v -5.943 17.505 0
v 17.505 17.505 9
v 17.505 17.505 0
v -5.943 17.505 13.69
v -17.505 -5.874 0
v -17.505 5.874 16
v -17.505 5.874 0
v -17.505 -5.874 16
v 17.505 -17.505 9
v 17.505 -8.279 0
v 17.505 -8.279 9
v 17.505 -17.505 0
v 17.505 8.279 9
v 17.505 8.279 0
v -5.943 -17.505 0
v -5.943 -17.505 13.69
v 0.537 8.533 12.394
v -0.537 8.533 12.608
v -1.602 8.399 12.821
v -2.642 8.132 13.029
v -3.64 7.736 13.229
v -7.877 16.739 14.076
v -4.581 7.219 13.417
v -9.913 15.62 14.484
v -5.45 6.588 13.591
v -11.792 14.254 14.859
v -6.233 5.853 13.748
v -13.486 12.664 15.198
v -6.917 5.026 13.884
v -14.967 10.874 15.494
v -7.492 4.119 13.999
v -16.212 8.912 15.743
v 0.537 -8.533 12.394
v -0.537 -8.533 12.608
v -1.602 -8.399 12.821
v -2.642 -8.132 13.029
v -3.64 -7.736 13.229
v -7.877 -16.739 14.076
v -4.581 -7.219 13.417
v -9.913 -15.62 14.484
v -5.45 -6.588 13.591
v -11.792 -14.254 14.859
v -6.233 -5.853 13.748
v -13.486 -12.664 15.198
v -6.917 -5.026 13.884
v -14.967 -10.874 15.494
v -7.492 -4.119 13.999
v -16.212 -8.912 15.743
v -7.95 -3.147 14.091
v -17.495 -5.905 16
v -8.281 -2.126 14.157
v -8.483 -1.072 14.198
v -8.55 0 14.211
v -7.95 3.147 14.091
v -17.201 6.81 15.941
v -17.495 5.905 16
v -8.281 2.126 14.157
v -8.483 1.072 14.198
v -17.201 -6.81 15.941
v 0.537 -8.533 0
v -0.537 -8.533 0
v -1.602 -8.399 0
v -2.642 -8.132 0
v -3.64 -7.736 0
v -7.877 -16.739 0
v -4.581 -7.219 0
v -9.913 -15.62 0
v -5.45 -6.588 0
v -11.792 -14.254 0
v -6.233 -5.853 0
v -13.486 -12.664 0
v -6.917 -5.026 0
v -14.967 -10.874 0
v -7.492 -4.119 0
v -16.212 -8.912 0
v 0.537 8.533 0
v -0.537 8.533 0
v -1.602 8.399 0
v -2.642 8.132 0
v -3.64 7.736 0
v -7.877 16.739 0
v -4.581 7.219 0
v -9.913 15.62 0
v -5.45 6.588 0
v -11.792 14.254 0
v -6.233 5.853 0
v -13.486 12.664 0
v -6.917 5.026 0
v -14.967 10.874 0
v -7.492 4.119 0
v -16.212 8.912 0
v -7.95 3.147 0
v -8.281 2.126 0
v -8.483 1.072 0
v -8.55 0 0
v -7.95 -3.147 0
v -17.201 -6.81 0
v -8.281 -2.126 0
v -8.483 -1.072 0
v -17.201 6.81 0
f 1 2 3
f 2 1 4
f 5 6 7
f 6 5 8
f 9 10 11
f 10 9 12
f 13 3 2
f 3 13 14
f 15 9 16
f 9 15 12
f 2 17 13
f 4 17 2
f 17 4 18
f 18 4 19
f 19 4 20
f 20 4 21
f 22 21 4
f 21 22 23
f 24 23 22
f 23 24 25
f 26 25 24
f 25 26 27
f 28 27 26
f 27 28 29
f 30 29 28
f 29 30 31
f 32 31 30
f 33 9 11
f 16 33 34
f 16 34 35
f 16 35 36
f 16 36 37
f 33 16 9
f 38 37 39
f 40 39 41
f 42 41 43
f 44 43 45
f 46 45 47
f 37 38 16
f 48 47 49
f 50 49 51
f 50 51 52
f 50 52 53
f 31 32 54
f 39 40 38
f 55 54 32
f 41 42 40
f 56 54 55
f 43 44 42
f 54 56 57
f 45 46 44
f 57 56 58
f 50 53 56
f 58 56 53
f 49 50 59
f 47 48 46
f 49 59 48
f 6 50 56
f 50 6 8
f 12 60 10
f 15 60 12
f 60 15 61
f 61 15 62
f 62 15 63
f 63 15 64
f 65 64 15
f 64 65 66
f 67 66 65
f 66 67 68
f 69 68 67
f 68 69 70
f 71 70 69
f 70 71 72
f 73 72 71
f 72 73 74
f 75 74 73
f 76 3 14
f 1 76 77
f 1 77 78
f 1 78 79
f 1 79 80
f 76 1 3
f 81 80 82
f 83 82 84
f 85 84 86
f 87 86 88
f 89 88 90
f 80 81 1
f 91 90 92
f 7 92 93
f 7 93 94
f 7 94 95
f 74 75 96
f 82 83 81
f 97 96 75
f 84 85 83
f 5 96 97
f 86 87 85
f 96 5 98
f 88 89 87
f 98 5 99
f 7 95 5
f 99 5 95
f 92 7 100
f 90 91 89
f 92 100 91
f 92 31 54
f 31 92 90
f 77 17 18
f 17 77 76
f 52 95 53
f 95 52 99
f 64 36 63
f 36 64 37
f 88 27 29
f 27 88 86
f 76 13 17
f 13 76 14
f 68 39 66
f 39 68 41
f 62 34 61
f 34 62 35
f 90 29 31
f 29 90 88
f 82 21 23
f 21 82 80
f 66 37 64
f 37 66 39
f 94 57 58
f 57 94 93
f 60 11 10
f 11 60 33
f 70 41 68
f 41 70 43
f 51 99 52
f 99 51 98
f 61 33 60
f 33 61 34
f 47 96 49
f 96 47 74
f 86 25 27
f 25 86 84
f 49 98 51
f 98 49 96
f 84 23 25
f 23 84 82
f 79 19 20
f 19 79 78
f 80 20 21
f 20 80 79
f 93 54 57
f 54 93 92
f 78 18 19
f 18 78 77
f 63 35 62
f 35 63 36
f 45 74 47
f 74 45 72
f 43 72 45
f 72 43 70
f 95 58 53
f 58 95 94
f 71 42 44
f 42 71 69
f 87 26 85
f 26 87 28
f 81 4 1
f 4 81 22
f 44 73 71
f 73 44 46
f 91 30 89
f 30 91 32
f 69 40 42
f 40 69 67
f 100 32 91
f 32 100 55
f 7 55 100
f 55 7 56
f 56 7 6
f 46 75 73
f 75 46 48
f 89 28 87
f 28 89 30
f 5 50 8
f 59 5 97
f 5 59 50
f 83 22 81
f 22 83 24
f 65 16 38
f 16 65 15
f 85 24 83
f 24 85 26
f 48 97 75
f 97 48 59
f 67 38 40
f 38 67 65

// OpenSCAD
$fn = 50;
neck_dia=17;
front_height=9;
back_height=16;
total_base_size=35;


module shaft_cutout() {
    hull() {
    cylinder(h=60,d=neck_dia+0.1,center=true);
    translate([(total_base_size+5)/2,0,0])
    cylinder(h=60,d=neck_dia-0.5,center=true);
    }
}

module cutout() {
        shaft_cutout();
   
}

module round_body() {
    difference(){
        hull() {
            corner_pos=total_base_size/2;

            translate([total_base_size/2,total_base_size/2,0.005])
                cube(0.01,center=true);
            translate([total_base_size/2,-total_base_size/2,0.005])
                cube(0.01,center=true);
            translate([-total_base_size/2,-total_base_size/2,0.005])
                cube(0.01,center=true);
            translate([-total_base_size/2,total_base_size/2,0.005])
                cube(0.01,center=true);

            translate([total_base_size/2,total_base_size/2,front_height-0.005])
                cube(0.01,center=true);
            translate([total_base_size/2,-total_base_size/2,front_height-0.005])
                cube(0.01,center=true);
            translate([-total_base_size/2,-total_base_size/2,back_height-0.005])
                cube(0.01,center=true);
            translate([-total_base_size/2,total_base_size/2,back_height-0.005])
                cube(0.01,center=true);
        }
        cutout();
    }
}
    
module tail_cut() {
    intersection() {
        round_body();
        difference() {
            cube([total_base_size+5,total_base_size+5,total_base_size*2],center=true);    
            cylinder(h=total_base_size*2,d=total_base_size+2,center=true);
            translate([(total_base_size+5)/4,0,0]) cube([(total_base_size+5)/2,total_base_size+5,total_base_size*2],center=true);    
        }
    }
}
    //Lineup aids
/*
    translate([total_base_size/2+2,0,front_height/2])
    cylinder(h=front_height,d=1,center=true);
        translate([-total_base_size/2-2,0,back_height/2])
    cylinder(h=back_height,d=1,center=true);
*/
difference(){
    round_body();
    translate([0,0,-0.5])
        scale([1,1,1.5])
            tail_cut();
}
